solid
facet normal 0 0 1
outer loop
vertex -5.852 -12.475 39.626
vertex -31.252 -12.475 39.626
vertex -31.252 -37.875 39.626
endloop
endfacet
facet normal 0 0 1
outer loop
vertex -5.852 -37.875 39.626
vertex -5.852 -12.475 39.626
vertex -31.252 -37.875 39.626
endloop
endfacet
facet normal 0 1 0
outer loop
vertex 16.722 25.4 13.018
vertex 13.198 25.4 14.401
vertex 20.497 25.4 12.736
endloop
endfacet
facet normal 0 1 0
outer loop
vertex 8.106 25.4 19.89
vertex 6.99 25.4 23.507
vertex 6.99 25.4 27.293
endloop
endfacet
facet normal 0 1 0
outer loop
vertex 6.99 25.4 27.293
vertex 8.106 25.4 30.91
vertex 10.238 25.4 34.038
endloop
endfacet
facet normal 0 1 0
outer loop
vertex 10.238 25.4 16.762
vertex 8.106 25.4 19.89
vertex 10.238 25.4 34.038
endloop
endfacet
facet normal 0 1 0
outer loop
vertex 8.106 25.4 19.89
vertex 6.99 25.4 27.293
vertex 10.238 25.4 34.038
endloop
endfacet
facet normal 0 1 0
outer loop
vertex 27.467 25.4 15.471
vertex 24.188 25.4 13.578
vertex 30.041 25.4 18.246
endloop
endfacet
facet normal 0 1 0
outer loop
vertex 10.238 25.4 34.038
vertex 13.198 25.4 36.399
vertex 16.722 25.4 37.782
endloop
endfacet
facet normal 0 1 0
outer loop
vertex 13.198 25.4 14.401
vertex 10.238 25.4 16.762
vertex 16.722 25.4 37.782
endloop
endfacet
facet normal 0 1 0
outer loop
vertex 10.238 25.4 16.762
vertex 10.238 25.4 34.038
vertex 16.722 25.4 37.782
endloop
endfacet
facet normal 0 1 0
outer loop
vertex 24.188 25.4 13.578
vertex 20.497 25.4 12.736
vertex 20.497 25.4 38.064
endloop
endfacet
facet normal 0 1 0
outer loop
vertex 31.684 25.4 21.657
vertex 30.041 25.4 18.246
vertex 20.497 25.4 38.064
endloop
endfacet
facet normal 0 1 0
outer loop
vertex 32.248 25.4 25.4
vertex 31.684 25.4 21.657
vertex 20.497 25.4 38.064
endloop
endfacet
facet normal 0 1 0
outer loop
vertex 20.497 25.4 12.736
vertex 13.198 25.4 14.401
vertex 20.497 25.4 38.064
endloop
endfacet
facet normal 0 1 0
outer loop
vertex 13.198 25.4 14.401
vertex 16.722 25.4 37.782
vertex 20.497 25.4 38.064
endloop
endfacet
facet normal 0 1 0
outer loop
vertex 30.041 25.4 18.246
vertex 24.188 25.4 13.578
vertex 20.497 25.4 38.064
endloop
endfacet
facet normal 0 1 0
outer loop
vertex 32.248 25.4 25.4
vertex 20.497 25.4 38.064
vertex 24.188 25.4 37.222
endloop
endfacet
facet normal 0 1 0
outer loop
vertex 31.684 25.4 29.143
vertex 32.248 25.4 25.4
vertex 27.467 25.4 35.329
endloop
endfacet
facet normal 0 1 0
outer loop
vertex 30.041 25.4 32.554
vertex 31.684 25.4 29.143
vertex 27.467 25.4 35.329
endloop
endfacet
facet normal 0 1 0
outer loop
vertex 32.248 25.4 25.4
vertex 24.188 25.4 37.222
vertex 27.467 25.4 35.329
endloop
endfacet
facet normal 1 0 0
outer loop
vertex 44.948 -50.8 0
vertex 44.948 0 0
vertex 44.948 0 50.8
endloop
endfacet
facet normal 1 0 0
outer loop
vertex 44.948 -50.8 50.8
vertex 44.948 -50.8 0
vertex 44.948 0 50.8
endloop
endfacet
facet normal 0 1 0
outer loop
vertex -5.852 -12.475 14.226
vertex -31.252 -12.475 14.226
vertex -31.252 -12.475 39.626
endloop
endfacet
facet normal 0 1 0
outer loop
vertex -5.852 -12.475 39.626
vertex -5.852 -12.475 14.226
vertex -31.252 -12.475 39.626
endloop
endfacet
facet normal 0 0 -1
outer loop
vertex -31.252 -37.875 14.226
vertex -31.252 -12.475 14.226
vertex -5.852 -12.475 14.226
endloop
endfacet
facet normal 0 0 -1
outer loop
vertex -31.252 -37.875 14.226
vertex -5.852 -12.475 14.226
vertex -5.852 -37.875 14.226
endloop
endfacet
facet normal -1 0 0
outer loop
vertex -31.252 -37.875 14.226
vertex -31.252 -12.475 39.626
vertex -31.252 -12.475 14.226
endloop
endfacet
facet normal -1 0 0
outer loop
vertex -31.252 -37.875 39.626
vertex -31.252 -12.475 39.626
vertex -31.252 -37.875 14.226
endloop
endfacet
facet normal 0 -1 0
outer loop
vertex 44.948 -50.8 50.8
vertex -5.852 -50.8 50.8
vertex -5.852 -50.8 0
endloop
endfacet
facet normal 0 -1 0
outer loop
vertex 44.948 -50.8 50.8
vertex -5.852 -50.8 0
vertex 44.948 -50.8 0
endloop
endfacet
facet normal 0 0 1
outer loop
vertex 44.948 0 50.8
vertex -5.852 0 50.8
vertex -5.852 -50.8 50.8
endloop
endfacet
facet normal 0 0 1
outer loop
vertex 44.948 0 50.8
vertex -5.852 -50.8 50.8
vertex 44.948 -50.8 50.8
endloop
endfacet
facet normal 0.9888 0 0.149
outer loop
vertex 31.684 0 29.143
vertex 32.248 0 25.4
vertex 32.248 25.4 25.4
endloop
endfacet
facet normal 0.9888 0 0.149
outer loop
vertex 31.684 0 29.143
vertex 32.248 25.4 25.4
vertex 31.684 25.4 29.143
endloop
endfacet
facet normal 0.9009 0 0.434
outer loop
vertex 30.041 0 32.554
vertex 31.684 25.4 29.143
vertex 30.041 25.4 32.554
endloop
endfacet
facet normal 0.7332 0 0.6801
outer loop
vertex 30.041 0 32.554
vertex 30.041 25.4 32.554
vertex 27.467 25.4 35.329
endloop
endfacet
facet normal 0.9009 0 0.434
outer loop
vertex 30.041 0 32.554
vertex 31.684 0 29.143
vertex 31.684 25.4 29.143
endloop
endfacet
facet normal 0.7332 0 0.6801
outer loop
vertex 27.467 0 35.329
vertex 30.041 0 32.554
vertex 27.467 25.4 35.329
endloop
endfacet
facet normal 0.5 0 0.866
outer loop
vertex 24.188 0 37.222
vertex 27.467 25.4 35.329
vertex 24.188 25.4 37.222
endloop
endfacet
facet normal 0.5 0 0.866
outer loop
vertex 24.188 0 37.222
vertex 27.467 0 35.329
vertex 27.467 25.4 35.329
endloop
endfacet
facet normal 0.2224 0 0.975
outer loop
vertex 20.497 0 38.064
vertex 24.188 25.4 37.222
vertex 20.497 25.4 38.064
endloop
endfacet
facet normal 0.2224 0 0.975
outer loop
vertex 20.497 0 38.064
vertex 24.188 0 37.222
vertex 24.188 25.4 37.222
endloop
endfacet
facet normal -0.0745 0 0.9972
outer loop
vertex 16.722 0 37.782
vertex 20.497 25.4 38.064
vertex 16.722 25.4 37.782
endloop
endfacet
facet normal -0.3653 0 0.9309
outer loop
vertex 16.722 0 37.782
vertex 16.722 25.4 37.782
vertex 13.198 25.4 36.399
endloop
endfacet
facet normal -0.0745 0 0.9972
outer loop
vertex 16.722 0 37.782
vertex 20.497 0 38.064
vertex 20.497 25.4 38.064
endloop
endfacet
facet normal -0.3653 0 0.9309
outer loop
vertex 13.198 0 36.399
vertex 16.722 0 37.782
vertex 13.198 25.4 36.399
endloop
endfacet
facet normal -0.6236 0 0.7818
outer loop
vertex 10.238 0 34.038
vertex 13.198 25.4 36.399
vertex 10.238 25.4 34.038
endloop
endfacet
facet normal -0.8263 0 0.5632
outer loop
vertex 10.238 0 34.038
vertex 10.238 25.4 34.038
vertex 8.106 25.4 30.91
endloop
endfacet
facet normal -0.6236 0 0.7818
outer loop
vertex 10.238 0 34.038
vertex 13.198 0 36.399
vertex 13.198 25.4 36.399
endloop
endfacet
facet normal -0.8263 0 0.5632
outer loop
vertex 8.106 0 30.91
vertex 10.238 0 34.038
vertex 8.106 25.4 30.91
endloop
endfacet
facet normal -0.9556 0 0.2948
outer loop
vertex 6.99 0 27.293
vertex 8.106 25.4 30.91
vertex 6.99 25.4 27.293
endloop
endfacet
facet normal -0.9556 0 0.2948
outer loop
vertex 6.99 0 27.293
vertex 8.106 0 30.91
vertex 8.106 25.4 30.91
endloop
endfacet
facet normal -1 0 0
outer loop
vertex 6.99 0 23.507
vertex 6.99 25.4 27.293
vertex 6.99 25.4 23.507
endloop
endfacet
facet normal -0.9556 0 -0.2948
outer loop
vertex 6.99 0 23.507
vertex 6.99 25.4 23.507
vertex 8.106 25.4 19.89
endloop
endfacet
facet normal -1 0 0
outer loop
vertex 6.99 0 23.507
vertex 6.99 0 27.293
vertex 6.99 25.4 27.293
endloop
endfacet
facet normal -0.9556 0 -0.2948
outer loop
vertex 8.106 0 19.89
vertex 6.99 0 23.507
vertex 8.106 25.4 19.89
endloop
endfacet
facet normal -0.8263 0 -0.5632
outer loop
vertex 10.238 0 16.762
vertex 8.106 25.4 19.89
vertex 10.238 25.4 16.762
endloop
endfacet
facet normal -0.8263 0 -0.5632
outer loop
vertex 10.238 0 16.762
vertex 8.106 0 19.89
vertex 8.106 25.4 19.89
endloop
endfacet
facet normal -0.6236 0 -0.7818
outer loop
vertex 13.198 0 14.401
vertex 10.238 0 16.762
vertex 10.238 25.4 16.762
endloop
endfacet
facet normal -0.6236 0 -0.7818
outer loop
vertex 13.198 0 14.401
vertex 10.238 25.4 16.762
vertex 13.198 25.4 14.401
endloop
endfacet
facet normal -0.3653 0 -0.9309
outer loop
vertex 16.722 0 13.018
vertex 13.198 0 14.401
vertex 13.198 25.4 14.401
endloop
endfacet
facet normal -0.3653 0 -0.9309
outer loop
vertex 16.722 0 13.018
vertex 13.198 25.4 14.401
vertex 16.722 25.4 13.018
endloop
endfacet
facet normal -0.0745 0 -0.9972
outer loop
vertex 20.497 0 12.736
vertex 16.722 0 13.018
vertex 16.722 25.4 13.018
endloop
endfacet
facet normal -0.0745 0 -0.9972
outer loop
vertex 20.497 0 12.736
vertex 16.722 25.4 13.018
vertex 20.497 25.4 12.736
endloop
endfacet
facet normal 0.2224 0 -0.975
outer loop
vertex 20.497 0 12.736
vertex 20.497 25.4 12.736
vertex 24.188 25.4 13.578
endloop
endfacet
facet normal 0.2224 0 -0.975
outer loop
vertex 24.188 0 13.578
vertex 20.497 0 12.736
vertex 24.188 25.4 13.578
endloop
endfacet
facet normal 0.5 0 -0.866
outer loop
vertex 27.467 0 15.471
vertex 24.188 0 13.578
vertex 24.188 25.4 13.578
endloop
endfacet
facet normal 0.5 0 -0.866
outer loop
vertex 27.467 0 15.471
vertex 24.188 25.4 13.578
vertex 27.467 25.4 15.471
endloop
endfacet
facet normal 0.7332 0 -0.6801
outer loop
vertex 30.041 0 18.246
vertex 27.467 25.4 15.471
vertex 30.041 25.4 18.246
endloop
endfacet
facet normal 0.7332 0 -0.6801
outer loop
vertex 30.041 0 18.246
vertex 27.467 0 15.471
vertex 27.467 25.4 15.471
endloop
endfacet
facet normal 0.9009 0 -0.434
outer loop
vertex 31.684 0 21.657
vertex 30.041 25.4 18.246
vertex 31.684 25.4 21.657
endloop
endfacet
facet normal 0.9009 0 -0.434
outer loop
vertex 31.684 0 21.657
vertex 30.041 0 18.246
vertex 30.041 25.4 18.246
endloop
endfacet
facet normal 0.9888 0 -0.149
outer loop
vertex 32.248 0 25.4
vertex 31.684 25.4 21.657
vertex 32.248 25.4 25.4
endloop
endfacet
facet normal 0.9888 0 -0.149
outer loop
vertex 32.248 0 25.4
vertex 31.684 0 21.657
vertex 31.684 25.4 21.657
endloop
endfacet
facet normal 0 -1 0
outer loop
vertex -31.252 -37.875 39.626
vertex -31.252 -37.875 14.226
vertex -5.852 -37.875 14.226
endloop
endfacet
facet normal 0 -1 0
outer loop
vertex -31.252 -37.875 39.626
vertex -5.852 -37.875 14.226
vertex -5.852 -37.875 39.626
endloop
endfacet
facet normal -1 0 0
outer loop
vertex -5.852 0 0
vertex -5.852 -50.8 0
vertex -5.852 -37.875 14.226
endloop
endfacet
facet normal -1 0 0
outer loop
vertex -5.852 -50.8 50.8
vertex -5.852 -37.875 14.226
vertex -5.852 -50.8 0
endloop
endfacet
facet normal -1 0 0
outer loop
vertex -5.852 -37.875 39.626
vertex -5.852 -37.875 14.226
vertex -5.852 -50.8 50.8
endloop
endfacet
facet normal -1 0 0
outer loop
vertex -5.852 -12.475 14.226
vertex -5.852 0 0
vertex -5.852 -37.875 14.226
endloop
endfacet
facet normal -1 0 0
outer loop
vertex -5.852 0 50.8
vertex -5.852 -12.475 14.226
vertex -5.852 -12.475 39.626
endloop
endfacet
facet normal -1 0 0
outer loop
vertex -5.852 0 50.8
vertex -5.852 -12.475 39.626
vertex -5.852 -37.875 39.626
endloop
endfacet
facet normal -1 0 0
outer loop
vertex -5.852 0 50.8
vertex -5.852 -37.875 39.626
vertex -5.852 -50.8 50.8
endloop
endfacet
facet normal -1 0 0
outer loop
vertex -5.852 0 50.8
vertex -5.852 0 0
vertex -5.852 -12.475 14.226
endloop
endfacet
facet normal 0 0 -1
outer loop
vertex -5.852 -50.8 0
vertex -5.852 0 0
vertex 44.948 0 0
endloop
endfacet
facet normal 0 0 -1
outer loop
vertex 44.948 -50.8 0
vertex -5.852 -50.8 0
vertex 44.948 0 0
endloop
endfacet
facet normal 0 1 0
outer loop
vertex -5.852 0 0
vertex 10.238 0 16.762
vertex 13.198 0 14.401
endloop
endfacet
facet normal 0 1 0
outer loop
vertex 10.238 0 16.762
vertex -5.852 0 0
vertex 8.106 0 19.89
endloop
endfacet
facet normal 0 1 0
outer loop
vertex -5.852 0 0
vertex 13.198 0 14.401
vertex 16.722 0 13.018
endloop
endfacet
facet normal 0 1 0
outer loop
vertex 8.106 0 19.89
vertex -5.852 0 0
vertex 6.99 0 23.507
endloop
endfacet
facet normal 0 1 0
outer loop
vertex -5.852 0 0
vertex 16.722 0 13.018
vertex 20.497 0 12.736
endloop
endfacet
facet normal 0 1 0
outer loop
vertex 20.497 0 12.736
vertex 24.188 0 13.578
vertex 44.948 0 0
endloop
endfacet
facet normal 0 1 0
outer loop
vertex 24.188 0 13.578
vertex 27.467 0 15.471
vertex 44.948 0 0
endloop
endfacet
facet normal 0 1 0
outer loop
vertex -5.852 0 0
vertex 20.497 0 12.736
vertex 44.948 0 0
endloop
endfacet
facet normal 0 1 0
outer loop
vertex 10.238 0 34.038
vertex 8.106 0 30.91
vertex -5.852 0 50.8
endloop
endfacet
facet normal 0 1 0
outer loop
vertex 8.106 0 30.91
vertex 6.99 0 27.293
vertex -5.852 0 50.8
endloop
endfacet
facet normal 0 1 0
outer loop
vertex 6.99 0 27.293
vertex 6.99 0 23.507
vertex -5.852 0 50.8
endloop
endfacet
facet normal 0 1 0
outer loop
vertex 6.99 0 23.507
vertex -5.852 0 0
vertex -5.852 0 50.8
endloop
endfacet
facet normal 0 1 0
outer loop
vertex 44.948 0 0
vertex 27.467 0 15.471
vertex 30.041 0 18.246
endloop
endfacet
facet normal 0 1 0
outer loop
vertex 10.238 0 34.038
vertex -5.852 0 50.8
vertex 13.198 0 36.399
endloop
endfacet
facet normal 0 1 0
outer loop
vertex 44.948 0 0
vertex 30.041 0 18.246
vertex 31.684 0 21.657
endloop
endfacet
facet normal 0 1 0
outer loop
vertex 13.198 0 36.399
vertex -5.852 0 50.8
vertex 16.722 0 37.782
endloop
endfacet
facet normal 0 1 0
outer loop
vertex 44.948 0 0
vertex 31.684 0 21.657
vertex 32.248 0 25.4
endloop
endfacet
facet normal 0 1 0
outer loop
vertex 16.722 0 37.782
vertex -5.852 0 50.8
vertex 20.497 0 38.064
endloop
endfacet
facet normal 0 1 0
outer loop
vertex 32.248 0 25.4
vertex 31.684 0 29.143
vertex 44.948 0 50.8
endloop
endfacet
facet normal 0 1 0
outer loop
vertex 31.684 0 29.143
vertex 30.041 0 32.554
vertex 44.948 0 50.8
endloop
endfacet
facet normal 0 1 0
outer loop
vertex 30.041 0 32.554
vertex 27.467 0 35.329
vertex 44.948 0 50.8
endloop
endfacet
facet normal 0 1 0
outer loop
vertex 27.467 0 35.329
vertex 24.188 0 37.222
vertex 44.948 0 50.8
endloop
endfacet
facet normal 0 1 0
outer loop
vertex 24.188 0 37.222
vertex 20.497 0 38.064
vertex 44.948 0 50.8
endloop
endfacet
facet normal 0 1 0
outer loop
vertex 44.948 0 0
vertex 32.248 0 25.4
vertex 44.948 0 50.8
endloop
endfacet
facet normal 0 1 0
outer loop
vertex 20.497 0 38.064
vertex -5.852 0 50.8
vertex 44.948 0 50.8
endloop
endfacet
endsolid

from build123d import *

# Parameters (mm, degrees)
F0_W     = 50.8
F0_H     = 50.8
F1_DEPTH = 50.8
F2_R     = 12.7
F3_DEPTH = 25.4
F4_W     = 25.4
F4_H     = 25.4
F5_DEPTH = 25.4


with BuildPart() as f1:
    # F0 (on Front) → F1 (new body)
    with BuildSketch(Plane.XZ):
        with Locations((19.548205, 25.4)):
            Rectangle(F0_W, F0_H)
    extrude(amount=F1_DEPTH)

    # F2 (on Front) → F3 (join)
    with BuildSketch(Plane.XZ):
        with Locations((19.548205, 25.4)):
            Circle(F2_R)
    extrude(amount=-F3_DEPTH)

    # F4 (on face) → F5 (join)
    with BuildSketch(Plane(origin=(-5.851795, 0, 0), x_dir=(0, -1, 0), z_dir=(-1, 0, 0))):
        with Locations((25.175295, 26.925846)):
            Rectangle(F4_W, F4_H)
    extrude(amount=F5_DEPTH)


solid = f1.part
